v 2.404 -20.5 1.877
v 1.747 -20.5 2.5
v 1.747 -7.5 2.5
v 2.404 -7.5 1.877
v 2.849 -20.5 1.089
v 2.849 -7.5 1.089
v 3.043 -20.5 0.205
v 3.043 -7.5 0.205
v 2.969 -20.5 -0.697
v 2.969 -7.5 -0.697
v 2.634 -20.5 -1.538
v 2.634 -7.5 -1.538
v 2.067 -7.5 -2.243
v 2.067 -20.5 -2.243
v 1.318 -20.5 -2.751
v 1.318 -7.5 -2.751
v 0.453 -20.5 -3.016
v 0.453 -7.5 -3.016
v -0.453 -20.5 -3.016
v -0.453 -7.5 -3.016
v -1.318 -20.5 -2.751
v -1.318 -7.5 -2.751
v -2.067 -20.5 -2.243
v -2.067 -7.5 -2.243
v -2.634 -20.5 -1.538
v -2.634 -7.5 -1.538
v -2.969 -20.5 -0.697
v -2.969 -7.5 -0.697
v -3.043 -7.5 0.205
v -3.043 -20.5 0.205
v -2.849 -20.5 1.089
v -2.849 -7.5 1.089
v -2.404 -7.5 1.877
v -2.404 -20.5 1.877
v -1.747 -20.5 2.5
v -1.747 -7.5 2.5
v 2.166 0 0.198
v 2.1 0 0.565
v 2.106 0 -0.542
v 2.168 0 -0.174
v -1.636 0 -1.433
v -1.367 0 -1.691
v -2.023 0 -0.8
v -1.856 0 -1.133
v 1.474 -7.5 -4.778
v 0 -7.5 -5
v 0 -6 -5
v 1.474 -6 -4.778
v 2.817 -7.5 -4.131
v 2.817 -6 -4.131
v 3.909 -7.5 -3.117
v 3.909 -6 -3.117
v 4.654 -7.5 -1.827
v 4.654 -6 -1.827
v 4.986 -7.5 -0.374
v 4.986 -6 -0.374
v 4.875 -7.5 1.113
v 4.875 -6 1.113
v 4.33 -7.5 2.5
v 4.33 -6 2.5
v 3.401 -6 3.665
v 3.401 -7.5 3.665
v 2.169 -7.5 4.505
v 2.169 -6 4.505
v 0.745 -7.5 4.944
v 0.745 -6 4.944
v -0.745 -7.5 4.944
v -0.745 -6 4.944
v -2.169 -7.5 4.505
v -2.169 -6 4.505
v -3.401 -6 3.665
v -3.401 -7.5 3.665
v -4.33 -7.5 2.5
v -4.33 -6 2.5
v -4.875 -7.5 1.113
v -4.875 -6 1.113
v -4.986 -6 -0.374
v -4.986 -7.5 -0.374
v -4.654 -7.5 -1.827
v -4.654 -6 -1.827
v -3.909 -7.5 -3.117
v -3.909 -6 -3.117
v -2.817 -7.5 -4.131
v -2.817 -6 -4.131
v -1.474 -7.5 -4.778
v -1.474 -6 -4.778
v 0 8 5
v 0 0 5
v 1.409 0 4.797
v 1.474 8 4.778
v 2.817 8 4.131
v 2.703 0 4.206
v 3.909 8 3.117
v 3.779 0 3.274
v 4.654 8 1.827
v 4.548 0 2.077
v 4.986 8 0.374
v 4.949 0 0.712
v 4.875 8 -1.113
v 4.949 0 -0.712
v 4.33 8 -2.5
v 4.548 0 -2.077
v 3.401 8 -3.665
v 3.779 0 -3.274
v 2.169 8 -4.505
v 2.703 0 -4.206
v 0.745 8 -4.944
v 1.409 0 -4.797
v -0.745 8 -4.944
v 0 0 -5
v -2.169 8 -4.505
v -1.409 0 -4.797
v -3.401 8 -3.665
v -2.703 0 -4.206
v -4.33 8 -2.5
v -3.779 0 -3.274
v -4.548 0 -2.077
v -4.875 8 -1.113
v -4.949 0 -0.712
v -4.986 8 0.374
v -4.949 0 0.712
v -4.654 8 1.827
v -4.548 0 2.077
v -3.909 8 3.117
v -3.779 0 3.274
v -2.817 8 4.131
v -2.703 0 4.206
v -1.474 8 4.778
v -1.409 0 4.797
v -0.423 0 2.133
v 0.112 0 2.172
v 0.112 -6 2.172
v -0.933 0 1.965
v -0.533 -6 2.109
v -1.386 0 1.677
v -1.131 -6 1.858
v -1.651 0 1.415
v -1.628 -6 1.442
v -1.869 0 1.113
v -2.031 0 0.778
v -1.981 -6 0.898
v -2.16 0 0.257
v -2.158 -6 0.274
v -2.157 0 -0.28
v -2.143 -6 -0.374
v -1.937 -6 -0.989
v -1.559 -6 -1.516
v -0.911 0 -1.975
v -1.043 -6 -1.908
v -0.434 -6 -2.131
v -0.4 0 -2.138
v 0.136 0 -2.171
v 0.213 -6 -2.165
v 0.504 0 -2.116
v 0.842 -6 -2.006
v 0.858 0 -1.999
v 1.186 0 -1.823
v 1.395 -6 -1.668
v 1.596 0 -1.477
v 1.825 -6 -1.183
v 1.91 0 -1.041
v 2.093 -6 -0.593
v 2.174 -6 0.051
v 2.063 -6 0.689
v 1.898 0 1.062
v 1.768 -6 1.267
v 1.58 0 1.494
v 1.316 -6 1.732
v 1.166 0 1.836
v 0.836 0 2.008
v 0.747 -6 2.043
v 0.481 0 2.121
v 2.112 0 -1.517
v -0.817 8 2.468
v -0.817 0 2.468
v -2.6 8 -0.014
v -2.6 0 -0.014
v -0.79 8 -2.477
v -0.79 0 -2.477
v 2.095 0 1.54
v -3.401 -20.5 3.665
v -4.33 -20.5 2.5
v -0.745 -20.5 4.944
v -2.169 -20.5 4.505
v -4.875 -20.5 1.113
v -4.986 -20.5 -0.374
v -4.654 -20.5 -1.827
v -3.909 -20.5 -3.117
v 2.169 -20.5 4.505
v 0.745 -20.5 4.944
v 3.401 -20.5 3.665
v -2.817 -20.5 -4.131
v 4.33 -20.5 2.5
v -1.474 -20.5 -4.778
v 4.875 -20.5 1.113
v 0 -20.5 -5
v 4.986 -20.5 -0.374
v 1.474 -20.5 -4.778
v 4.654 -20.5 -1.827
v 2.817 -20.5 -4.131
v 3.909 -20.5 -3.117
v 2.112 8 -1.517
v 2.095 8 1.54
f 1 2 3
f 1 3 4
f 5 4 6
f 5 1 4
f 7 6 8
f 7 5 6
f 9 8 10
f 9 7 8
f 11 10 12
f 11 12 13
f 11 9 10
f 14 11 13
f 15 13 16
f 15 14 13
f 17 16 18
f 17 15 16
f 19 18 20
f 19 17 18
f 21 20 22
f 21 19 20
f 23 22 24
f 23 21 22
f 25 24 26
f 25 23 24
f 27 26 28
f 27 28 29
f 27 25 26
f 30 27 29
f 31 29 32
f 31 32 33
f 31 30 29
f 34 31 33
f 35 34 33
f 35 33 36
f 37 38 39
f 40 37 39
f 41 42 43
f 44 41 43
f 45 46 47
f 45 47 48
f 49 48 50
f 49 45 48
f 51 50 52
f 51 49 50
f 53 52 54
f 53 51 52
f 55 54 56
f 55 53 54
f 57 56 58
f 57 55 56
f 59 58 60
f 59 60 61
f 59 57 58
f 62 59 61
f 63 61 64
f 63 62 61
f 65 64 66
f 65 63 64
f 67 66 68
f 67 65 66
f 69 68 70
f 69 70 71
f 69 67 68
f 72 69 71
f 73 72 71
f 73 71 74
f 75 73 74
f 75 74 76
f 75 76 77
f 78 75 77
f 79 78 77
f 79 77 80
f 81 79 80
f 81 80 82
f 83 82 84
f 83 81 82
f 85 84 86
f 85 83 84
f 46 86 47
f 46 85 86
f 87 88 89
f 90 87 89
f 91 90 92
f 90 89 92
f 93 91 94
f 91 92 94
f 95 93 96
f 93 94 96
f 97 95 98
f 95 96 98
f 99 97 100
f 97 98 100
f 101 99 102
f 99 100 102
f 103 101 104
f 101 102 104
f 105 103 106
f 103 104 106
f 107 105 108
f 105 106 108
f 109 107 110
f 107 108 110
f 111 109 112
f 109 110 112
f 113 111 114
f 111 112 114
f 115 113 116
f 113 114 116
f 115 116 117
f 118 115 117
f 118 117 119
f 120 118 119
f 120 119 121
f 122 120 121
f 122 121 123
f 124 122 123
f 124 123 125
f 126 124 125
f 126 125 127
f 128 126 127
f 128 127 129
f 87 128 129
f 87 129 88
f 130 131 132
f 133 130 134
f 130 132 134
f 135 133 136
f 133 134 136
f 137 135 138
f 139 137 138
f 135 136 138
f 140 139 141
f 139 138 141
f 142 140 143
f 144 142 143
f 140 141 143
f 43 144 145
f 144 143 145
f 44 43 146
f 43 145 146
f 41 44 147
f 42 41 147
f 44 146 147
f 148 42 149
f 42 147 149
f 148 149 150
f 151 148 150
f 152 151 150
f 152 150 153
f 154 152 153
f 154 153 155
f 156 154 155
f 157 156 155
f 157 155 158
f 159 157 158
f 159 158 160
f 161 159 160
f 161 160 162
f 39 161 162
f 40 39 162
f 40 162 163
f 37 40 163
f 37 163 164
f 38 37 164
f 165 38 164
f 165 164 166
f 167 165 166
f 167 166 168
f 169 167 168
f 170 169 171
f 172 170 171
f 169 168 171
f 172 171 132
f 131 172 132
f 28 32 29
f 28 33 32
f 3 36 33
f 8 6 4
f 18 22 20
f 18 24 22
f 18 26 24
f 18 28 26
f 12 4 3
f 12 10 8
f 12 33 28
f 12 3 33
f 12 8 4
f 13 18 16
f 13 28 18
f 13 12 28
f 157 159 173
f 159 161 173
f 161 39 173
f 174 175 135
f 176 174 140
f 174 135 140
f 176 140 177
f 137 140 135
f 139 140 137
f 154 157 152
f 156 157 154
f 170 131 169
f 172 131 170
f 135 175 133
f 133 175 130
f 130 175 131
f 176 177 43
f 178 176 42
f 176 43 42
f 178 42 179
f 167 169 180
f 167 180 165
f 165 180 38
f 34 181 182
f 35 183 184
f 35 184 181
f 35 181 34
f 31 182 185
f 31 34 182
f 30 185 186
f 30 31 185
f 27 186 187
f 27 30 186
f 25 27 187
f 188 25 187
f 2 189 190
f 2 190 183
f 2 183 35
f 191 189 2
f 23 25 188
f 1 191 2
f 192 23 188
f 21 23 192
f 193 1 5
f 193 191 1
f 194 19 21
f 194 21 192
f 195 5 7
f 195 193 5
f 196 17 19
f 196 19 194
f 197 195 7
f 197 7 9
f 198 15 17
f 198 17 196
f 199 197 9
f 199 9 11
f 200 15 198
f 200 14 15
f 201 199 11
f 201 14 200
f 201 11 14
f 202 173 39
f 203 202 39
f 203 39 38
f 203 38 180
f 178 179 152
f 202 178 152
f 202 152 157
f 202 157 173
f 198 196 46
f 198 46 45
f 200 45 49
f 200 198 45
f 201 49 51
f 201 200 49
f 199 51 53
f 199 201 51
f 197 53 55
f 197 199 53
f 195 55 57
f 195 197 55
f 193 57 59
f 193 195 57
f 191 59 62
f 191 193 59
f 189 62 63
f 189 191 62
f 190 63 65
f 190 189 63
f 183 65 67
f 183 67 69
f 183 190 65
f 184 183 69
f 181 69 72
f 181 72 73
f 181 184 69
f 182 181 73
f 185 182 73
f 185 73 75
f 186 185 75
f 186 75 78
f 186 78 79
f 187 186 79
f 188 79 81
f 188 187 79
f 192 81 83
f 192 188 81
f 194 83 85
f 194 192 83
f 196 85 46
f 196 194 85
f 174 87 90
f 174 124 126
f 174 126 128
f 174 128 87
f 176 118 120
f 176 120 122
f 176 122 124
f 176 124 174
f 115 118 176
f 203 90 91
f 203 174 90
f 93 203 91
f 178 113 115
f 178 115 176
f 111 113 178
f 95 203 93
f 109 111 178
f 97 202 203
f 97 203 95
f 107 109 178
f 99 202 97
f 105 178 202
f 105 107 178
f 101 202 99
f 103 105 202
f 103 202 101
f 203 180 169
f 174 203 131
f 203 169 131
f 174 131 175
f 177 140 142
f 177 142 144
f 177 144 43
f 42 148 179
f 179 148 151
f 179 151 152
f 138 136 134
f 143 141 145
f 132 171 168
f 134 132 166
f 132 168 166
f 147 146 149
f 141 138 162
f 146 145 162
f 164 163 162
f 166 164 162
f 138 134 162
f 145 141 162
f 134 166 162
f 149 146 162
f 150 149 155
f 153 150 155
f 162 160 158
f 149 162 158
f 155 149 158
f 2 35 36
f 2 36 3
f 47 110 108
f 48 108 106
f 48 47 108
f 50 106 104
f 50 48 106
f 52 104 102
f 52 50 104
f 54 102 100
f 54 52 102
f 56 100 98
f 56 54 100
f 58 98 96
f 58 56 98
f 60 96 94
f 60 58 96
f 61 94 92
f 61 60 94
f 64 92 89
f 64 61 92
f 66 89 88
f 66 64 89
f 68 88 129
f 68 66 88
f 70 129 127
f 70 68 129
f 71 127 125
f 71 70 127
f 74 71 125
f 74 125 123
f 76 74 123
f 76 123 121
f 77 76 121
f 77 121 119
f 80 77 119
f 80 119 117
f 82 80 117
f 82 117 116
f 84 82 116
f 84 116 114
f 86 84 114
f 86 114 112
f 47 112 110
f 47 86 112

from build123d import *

# Parameters (mm, degrees)
SKETCH1_R           = 5
SKETCH1_R_2         = 2.6
BOSS_EXTRUDE1_DEPTH = 8
BOSS_EXTRUDE2_START = 6
SKETCH2_R           = 5
SKETCH2_R_2         = 2.175
BOSS_EXTRUDE2_DEPTH = 6
BOSS_EXTRUDE3_START = 1.5
SKETCH3_R           = 5
BOSS_EXTRUDE3_DEPTH = 1.5
BOSS_EXTRUDE4_START = 13
SKETCH4_R           = 5
BOSS_EXTRUDE4_DEPTH = 13


with BuildPart() as part:
    # Sketch1 → Boss-Extrude1 (new body)
    # profile 1 of 6: a face of its own
    with BuildSketch(Plane(origin=(0, 0, 0), x_dir=(1, 0, 0), z_dir=(0, 1, 0))):
        with Locations(Location((0, 0, 0), (0, 0, 270))):
            Circle(SKETCH1_R)
        Circle(SKETCH1_R_2, mode=Mode.SUBTRACT)
    # profile 2 of 6: a face of its own
    with BuildSketch(Plane(origin=(0, 0, 0), x_dir=(1, 0, 0), z_dir=(0, 1, 0))):
        with BuildLine():
            Line((2.111719424, 1.51678643), (2.095106807, -1.539651735))
            ThreePointArc((2.095106807, -1.539651735), (2.470554361, -0.810161188), (2.6, 0))
            ThreePointArc((2.6, 0), (2.474921262, 0.796721249), (2.111719424, 1.51678643))
        make_face()
    # profile 3 of 6: a face of its own
    with BuildSketch(Plane(origin=(0, 0, 0), x_dir=(1, 0, 0), z_dir=(0, 1, 0))):
        with BuildLine():
            ThreePointArc((-0.816872207, -2.468343533), (0.789992429, -2.477077303), (2.095106807, -1.539651735))
            Line((2.095106807, -1.539651735), (-0.816872207, -2.468343533))
        make_face()
    # profile 4 of 6: a face of its own
    with BuildSketch(Plane(origin=(0, 0, 0), x_dir=(1, 0, 0), z_dir=(0, 1, 0))):
        with BuildLine():
            ThreePointArc((-2.599961596, 0.014131536), (-2.111719424, -1.51678643), (-0.816872207, -2.468343533))
            Line((-0.816872207, -2.468343533), (-2.599961596, 0.014131536))
        make_face()
    # profile 5 of 6: a face of its own
    with BuildSketch(Plane(origin=(0, 0, 0), x_dir=(1, 0, 0), z_dir=(0, 1, 0))):
        with BuildLine():
            Line((-2.599961596, 0.014131536), (-0.789992429, 2.477077303))
            ThreePointArc((-0.789992429, 2.477077303), (-2.095106807, 1.539651735), (-2.599961596, 0.014131536))
        make_face()
    # profile 6 of 6: a face of its own
    with BuildSketch(Plane(origin=(0, 0, 0), x_dir=(1, 0, 0), z_dir=(0, 1, 0))):
        with BuildLine():
            Line((-0.789992429, 2.477077303), (2.111719424, 1.51678643))
            ThreePointArc((2.111719424, 1.51678643), (0.816872207, 2.468343533), (-0.789992429, 2.477077303))
        make_face()
    extrude(amount=BOSS_EXTRUDE1_DEPTH)

    # Sketch2 → Boss-Extrude2 (add)
    with BuildSketch(Plane.XZ.offset(BOSS_EXTRUDE2_START)):
        with Locations(Location((0, 0, 0), (0, 0, 270))):
            Circle(SKETCH2_R)
        with Locations(Location((0, 0, 0), (0, 0, 87.049070531))):
            Circle(SKETCH2_R_2, mode=Mode.SUBTRACT)
    extrude(amount=-BOSS_EXTRUDE2_DEPTH)

    # Sketch3 → Boss-Extrude3 (add)
    with BuildSketch(Plane.XZ.offset(6).offset(BOSS_EXTRUDE3_START)):
        with Locations(Location((0, 0, 0), (0, 0, 270))):
            Circle(SKETCH3_R)
    extrude(amount=-BOSS_EXTRUDE3_DEPTH)

    # Sketch4 → Boss-Extrude4 (add)
    with BuildSketch(Plane.XZ.offset(7.5).offset(BOSS_EXTRUDE4_START)):
        with Locations(Location((0, 0, 0), (0, 0, 270))):
            Circle(SKETCH4_R)
        with BuildLine():
            Line((-1.747140521, 2.5), (1.747140521, 2.5))
            ThreePointArc((1.747140521, 2.5), (0, -3.05), (-1.747140521, 2.5))
        make_face(mode=Mode.SUBTRACT)
    extrude(amount=-BOSS_EXTRUDE4_DEPTH)


solid = part.part
